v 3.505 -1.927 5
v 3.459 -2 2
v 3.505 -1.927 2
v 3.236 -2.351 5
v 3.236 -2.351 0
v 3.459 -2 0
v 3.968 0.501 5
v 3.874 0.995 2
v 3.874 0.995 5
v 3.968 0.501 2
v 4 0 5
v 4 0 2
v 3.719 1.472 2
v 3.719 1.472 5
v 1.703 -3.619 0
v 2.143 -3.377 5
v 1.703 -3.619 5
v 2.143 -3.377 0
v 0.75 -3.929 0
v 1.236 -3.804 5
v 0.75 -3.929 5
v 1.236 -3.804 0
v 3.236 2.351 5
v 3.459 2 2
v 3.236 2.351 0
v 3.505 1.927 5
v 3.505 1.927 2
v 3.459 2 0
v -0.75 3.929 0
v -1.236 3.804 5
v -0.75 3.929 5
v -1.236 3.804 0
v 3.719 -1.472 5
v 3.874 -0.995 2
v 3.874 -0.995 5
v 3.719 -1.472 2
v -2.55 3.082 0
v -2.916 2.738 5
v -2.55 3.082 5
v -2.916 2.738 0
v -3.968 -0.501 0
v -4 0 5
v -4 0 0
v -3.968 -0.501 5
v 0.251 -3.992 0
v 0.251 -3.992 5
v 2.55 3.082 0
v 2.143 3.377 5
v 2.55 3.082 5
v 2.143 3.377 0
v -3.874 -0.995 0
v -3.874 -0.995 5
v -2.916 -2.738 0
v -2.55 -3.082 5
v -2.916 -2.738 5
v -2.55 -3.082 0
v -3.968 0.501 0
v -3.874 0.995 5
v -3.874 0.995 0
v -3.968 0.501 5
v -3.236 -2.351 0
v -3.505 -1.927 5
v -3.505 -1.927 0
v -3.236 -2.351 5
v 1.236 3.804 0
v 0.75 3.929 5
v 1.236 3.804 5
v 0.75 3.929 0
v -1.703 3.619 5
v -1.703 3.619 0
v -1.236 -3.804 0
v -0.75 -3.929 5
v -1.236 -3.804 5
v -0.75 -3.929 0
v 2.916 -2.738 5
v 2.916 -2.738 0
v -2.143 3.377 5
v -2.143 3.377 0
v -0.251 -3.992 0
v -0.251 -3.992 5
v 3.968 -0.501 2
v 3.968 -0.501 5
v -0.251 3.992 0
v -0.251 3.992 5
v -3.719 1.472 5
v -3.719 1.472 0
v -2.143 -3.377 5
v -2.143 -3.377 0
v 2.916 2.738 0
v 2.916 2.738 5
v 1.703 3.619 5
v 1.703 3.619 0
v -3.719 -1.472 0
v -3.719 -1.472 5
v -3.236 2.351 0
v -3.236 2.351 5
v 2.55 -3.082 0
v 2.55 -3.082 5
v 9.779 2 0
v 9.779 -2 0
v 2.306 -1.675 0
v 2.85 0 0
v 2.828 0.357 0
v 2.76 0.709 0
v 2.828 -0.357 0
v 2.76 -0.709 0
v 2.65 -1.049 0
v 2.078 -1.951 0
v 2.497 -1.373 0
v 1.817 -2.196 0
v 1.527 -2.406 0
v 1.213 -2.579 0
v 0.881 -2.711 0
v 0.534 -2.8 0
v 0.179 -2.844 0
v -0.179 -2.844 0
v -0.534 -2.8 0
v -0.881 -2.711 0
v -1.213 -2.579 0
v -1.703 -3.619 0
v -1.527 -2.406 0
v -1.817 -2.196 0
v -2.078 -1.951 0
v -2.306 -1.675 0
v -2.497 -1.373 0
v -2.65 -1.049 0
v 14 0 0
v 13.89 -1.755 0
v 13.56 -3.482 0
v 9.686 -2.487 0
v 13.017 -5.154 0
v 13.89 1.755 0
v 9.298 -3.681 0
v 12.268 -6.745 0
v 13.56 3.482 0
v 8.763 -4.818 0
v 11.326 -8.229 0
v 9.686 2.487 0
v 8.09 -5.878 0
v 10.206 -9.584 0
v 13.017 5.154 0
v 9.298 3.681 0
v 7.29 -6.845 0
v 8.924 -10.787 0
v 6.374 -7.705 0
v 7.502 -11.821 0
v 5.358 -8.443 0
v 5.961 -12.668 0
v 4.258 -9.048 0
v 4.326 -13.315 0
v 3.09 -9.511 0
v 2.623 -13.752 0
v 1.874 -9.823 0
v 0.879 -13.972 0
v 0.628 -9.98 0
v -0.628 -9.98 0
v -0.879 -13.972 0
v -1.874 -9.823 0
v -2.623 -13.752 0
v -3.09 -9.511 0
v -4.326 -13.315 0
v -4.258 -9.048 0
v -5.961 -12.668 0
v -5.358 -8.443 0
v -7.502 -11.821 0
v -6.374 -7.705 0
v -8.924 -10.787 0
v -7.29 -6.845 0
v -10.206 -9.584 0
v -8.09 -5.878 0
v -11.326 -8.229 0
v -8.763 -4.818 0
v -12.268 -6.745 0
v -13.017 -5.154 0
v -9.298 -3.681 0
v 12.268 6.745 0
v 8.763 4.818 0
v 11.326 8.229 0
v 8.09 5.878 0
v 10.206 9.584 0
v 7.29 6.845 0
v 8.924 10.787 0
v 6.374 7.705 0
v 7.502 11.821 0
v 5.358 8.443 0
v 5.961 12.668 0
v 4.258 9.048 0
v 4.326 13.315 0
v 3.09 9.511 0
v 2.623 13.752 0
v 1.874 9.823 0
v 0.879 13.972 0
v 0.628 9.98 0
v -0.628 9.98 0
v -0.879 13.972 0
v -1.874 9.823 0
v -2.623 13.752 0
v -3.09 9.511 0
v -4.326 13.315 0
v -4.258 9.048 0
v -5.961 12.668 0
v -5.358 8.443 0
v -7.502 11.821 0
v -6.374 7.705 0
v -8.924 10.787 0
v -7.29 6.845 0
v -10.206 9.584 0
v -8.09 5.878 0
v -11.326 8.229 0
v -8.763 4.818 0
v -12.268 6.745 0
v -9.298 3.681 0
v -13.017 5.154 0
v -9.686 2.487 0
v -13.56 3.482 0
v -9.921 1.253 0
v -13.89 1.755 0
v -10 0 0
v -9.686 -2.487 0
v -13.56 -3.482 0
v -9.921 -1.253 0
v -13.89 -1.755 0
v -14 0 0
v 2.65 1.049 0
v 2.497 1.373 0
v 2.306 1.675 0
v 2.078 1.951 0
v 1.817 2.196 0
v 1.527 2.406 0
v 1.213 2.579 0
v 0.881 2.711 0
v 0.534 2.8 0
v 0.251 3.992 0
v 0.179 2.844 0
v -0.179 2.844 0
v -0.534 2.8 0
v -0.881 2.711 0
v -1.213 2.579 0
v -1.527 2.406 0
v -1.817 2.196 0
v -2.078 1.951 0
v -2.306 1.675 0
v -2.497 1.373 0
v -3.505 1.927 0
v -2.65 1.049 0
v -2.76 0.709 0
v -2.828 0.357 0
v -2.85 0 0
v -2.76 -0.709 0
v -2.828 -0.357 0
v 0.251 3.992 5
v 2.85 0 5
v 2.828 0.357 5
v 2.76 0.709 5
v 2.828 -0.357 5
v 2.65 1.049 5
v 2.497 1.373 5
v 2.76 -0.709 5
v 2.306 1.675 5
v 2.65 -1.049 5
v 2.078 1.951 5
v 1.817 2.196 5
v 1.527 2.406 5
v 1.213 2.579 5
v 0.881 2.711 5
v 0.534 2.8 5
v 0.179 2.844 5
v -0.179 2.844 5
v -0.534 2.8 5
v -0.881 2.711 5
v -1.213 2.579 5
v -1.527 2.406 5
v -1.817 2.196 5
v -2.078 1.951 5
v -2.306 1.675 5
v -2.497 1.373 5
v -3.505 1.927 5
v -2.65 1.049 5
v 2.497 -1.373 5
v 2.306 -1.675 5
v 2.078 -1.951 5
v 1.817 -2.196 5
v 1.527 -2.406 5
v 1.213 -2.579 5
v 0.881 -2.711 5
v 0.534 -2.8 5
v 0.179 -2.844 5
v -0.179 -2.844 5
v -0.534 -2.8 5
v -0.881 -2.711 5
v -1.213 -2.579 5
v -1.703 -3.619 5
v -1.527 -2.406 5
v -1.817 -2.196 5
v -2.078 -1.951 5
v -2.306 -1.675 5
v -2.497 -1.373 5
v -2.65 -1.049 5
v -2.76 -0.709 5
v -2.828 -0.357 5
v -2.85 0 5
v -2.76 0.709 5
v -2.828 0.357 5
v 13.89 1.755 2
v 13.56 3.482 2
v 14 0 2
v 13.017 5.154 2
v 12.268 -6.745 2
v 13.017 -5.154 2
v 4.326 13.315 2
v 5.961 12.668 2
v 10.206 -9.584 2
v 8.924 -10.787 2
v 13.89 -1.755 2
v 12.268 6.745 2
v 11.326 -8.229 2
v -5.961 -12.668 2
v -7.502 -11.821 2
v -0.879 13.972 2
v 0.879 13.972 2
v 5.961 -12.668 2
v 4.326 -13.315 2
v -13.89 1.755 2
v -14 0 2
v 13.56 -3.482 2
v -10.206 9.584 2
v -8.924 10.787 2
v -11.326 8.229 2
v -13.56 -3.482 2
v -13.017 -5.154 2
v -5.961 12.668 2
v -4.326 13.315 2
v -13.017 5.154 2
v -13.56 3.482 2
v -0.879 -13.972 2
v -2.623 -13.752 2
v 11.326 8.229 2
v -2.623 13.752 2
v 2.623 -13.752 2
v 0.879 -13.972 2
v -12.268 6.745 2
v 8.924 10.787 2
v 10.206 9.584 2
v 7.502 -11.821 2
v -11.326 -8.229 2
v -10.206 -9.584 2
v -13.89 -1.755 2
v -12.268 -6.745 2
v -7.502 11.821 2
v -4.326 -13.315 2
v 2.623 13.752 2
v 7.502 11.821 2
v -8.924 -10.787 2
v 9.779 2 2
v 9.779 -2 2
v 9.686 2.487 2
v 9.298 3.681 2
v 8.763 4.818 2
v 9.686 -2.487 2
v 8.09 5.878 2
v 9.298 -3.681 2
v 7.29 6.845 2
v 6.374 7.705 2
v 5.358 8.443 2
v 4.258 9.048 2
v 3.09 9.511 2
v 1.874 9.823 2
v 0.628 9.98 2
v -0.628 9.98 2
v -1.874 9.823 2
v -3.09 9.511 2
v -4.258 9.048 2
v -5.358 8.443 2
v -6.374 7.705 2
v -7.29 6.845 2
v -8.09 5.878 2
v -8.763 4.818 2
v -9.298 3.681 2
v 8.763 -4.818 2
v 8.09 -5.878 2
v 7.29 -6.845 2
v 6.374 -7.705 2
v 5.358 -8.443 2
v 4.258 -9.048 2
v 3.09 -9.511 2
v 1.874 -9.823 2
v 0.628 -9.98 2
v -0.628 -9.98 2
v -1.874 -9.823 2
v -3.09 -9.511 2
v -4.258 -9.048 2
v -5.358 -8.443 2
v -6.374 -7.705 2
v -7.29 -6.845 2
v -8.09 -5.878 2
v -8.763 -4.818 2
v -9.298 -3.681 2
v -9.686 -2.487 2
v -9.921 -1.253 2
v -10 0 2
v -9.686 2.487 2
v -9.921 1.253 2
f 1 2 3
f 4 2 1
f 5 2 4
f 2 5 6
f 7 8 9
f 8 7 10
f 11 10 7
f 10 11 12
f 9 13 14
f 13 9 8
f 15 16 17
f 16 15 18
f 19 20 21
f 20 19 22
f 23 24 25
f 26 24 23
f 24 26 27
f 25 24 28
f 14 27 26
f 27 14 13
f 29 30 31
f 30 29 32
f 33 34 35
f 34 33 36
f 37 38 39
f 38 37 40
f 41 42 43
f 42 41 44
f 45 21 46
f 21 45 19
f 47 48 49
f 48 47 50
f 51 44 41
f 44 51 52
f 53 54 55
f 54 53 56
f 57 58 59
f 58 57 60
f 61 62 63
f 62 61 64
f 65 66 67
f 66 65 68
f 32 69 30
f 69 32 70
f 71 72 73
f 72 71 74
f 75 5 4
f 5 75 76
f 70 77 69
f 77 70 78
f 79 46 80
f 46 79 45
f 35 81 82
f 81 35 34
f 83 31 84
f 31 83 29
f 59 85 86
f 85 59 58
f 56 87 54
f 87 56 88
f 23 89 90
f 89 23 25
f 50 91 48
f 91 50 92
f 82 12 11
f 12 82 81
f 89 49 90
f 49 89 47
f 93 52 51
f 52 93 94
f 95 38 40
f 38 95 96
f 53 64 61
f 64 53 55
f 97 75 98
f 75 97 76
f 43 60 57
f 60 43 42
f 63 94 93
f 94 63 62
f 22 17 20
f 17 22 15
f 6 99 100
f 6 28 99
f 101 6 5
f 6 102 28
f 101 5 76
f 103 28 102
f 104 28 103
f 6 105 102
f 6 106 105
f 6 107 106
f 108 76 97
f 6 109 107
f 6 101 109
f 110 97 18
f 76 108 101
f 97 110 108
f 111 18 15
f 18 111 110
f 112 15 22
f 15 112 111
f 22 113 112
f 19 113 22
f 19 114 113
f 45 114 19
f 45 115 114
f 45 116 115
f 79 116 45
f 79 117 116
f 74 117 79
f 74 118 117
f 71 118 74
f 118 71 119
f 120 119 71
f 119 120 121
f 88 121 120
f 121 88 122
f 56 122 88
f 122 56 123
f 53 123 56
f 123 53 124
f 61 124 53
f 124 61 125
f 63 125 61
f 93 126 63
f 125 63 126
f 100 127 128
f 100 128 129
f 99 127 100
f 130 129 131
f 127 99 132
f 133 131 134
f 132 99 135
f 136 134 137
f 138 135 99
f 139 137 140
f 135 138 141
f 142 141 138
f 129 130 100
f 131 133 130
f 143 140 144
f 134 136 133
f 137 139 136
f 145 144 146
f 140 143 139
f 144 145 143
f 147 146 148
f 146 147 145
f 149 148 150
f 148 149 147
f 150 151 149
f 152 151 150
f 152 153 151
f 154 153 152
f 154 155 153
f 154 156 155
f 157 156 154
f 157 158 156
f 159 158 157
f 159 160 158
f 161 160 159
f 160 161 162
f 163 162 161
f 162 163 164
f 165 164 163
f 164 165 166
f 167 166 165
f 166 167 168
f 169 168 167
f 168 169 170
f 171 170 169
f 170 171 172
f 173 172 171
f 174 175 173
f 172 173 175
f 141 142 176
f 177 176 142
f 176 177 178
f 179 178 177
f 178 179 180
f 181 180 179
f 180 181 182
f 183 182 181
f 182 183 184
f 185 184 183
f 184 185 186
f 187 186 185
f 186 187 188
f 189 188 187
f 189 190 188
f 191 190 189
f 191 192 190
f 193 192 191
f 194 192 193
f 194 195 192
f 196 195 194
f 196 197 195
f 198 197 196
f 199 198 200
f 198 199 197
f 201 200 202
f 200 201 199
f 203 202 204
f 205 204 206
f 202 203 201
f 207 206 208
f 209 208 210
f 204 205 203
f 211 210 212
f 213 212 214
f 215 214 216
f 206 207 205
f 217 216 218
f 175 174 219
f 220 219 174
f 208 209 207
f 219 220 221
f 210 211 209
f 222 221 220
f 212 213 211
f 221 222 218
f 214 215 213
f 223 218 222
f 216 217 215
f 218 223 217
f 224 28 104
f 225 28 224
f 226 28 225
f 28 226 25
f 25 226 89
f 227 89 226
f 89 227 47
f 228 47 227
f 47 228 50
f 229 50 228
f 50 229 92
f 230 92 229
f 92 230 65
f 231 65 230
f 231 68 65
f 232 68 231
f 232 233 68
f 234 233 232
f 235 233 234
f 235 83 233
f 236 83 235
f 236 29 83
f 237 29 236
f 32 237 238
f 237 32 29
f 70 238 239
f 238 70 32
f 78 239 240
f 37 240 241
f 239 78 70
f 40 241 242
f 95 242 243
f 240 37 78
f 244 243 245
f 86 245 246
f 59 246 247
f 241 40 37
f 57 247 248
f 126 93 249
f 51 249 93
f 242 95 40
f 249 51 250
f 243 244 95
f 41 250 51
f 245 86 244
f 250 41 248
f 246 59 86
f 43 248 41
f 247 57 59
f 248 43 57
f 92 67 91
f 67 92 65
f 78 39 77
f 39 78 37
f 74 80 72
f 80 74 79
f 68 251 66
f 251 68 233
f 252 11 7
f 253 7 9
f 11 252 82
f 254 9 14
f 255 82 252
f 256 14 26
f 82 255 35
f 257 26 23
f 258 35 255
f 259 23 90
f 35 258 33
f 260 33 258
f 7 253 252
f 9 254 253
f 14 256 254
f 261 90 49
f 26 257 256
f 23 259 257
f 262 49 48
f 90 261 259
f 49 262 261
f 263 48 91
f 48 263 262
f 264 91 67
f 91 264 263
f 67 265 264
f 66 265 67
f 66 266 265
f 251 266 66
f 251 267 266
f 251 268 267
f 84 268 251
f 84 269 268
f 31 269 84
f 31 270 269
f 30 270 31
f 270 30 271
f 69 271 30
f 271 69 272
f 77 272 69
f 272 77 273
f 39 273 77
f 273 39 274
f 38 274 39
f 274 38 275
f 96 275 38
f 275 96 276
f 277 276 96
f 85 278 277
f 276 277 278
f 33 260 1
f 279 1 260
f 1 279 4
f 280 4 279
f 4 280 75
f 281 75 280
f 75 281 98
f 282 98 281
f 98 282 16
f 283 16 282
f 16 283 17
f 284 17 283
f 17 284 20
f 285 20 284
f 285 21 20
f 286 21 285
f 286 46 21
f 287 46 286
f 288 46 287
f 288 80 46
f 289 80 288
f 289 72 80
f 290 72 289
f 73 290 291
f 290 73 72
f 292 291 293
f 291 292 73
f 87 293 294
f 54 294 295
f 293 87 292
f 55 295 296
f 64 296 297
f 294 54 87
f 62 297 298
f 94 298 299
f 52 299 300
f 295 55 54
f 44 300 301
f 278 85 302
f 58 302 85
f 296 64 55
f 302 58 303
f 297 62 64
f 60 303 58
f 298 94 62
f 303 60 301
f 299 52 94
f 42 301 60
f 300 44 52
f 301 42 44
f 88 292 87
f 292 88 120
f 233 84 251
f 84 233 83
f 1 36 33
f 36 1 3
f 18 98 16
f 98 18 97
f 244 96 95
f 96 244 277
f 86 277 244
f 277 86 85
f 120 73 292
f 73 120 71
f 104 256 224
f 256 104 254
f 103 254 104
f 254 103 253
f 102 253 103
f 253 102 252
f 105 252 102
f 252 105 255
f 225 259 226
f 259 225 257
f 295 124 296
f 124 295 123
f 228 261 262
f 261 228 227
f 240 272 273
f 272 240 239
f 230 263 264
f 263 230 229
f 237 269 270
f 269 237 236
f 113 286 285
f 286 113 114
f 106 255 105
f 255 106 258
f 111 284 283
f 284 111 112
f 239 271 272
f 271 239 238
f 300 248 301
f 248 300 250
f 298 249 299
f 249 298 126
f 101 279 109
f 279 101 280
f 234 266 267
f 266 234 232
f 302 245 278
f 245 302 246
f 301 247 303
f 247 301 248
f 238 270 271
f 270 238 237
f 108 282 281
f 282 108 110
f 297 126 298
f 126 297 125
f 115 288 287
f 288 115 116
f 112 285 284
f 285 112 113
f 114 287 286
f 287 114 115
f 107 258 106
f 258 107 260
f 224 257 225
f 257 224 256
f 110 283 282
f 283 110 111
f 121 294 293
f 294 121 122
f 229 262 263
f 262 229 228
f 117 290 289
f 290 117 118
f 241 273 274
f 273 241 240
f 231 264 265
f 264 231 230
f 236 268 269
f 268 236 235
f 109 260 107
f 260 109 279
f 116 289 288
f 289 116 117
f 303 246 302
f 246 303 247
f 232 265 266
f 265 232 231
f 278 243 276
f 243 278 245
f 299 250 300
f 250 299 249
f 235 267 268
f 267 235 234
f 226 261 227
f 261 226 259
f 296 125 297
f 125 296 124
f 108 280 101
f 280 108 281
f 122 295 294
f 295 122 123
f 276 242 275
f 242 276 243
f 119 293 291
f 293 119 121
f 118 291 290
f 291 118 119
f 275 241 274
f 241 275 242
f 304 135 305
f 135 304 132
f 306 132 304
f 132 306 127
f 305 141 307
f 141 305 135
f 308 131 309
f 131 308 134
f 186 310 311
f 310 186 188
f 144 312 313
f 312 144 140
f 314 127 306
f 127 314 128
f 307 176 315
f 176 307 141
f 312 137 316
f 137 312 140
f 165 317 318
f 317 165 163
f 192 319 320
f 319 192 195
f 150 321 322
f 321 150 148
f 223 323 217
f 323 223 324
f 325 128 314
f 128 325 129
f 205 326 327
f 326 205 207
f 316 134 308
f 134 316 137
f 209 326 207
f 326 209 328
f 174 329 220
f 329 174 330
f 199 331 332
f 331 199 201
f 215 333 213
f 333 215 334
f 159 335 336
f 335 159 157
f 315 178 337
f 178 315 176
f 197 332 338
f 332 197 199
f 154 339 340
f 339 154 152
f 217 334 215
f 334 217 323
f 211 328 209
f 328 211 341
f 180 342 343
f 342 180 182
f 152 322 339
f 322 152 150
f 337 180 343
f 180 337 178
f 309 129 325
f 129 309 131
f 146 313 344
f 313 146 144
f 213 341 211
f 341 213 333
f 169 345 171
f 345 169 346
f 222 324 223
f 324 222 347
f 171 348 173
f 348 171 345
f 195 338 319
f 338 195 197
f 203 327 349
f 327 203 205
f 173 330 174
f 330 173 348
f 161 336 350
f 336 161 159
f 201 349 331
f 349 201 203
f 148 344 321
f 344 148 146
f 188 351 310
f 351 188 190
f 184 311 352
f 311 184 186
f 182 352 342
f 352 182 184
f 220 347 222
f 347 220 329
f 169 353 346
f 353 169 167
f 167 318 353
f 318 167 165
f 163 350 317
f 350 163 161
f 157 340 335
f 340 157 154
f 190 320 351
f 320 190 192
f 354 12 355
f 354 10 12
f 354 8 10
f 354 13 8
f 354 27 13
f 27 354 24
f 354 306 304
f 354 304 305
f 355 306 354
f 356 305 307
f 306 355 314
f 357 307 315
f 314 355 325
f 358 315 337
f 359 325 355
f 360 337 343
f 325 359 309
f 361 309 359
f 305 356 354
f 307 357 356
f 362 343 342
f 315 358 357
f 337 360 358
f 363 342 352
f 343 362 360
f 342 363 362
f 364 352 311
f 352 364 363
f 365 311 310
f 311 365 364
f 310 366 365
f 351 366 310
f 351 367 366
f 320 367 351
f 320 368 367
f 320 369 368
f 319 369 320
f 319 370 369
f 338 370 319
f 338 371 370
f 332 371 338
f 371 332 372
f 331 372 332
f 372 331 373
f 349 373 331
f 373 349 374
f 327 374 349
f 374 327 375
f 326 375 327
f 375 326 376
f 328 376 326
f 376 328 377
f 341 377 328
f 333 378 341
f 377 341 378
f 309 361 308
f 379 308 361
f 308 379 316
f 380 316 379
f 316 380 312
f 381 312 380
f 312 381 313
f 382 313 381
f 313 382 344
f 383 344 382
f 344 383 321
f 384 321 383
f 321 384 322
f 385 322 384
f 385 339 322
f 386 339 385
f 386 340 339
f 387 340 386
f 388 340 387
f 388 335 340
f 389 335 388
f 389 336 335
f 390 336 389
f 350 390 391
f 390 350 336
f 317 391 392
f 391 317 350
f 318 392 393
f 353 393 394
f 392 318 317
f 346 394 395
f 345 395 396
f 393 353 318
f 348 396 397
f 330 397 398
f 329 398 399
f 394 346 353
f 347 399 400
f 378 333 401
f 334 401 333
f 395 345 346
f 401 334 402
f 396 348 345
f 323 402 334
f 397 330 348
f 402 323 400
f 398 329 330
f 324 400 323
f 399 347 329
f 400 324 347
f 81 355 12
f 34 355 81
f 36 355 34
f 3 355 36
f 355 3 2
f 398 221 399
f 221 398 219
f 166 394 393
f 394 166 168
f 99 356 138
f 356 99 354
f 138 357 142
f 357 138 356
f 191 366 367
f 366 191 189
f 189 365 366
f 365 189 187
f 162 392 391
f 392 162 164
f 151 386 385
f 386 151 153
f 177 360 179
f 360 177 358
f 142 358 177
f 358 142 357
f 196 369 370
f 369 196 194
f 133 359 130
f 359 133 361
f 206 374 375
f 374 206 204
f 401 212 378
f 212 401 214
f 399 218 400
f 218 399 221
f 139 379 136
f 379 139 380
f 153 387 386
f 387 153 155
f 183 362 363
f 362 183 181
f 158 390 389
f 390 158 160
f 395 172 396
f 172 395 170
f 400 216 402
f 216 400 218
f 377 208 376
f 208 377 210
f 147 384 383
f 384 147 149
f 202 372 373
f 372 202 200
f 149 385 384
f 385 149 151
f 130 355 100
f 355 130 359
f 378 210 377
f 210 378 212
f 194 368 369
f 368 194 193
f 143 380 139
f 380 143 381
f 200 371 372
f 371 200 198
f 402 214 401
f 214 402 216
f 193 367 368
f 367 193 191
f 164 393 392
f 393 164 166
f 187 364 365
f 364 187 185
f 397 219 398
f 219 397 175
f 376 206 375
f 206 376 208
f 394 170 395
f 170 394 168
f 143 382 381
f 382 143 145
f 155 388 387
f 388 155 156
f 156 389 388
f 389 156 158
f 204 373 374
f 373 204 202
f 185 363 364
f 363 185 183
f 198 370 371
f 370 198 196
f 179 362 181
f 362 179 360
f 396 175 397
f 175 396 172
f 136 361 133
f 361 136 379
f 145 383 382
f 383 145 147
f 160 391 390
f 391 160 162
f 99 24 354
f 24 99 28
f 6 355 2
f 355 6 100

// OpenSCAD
$fn = 50;
difference(){
	cylinder(r=4, h=5);
	translate([0,0,-1]){
		cylinder(r=2.85, h=12);
	}
}
translate([3,-2,0]){
	cube([10,4,2]);
}

translate([0,0,0]){
difference(){
	cylinder(r=14, h=2);
	translate([0,0,-2]){
		cylinder(r=10, h=6);
	}
}
}
